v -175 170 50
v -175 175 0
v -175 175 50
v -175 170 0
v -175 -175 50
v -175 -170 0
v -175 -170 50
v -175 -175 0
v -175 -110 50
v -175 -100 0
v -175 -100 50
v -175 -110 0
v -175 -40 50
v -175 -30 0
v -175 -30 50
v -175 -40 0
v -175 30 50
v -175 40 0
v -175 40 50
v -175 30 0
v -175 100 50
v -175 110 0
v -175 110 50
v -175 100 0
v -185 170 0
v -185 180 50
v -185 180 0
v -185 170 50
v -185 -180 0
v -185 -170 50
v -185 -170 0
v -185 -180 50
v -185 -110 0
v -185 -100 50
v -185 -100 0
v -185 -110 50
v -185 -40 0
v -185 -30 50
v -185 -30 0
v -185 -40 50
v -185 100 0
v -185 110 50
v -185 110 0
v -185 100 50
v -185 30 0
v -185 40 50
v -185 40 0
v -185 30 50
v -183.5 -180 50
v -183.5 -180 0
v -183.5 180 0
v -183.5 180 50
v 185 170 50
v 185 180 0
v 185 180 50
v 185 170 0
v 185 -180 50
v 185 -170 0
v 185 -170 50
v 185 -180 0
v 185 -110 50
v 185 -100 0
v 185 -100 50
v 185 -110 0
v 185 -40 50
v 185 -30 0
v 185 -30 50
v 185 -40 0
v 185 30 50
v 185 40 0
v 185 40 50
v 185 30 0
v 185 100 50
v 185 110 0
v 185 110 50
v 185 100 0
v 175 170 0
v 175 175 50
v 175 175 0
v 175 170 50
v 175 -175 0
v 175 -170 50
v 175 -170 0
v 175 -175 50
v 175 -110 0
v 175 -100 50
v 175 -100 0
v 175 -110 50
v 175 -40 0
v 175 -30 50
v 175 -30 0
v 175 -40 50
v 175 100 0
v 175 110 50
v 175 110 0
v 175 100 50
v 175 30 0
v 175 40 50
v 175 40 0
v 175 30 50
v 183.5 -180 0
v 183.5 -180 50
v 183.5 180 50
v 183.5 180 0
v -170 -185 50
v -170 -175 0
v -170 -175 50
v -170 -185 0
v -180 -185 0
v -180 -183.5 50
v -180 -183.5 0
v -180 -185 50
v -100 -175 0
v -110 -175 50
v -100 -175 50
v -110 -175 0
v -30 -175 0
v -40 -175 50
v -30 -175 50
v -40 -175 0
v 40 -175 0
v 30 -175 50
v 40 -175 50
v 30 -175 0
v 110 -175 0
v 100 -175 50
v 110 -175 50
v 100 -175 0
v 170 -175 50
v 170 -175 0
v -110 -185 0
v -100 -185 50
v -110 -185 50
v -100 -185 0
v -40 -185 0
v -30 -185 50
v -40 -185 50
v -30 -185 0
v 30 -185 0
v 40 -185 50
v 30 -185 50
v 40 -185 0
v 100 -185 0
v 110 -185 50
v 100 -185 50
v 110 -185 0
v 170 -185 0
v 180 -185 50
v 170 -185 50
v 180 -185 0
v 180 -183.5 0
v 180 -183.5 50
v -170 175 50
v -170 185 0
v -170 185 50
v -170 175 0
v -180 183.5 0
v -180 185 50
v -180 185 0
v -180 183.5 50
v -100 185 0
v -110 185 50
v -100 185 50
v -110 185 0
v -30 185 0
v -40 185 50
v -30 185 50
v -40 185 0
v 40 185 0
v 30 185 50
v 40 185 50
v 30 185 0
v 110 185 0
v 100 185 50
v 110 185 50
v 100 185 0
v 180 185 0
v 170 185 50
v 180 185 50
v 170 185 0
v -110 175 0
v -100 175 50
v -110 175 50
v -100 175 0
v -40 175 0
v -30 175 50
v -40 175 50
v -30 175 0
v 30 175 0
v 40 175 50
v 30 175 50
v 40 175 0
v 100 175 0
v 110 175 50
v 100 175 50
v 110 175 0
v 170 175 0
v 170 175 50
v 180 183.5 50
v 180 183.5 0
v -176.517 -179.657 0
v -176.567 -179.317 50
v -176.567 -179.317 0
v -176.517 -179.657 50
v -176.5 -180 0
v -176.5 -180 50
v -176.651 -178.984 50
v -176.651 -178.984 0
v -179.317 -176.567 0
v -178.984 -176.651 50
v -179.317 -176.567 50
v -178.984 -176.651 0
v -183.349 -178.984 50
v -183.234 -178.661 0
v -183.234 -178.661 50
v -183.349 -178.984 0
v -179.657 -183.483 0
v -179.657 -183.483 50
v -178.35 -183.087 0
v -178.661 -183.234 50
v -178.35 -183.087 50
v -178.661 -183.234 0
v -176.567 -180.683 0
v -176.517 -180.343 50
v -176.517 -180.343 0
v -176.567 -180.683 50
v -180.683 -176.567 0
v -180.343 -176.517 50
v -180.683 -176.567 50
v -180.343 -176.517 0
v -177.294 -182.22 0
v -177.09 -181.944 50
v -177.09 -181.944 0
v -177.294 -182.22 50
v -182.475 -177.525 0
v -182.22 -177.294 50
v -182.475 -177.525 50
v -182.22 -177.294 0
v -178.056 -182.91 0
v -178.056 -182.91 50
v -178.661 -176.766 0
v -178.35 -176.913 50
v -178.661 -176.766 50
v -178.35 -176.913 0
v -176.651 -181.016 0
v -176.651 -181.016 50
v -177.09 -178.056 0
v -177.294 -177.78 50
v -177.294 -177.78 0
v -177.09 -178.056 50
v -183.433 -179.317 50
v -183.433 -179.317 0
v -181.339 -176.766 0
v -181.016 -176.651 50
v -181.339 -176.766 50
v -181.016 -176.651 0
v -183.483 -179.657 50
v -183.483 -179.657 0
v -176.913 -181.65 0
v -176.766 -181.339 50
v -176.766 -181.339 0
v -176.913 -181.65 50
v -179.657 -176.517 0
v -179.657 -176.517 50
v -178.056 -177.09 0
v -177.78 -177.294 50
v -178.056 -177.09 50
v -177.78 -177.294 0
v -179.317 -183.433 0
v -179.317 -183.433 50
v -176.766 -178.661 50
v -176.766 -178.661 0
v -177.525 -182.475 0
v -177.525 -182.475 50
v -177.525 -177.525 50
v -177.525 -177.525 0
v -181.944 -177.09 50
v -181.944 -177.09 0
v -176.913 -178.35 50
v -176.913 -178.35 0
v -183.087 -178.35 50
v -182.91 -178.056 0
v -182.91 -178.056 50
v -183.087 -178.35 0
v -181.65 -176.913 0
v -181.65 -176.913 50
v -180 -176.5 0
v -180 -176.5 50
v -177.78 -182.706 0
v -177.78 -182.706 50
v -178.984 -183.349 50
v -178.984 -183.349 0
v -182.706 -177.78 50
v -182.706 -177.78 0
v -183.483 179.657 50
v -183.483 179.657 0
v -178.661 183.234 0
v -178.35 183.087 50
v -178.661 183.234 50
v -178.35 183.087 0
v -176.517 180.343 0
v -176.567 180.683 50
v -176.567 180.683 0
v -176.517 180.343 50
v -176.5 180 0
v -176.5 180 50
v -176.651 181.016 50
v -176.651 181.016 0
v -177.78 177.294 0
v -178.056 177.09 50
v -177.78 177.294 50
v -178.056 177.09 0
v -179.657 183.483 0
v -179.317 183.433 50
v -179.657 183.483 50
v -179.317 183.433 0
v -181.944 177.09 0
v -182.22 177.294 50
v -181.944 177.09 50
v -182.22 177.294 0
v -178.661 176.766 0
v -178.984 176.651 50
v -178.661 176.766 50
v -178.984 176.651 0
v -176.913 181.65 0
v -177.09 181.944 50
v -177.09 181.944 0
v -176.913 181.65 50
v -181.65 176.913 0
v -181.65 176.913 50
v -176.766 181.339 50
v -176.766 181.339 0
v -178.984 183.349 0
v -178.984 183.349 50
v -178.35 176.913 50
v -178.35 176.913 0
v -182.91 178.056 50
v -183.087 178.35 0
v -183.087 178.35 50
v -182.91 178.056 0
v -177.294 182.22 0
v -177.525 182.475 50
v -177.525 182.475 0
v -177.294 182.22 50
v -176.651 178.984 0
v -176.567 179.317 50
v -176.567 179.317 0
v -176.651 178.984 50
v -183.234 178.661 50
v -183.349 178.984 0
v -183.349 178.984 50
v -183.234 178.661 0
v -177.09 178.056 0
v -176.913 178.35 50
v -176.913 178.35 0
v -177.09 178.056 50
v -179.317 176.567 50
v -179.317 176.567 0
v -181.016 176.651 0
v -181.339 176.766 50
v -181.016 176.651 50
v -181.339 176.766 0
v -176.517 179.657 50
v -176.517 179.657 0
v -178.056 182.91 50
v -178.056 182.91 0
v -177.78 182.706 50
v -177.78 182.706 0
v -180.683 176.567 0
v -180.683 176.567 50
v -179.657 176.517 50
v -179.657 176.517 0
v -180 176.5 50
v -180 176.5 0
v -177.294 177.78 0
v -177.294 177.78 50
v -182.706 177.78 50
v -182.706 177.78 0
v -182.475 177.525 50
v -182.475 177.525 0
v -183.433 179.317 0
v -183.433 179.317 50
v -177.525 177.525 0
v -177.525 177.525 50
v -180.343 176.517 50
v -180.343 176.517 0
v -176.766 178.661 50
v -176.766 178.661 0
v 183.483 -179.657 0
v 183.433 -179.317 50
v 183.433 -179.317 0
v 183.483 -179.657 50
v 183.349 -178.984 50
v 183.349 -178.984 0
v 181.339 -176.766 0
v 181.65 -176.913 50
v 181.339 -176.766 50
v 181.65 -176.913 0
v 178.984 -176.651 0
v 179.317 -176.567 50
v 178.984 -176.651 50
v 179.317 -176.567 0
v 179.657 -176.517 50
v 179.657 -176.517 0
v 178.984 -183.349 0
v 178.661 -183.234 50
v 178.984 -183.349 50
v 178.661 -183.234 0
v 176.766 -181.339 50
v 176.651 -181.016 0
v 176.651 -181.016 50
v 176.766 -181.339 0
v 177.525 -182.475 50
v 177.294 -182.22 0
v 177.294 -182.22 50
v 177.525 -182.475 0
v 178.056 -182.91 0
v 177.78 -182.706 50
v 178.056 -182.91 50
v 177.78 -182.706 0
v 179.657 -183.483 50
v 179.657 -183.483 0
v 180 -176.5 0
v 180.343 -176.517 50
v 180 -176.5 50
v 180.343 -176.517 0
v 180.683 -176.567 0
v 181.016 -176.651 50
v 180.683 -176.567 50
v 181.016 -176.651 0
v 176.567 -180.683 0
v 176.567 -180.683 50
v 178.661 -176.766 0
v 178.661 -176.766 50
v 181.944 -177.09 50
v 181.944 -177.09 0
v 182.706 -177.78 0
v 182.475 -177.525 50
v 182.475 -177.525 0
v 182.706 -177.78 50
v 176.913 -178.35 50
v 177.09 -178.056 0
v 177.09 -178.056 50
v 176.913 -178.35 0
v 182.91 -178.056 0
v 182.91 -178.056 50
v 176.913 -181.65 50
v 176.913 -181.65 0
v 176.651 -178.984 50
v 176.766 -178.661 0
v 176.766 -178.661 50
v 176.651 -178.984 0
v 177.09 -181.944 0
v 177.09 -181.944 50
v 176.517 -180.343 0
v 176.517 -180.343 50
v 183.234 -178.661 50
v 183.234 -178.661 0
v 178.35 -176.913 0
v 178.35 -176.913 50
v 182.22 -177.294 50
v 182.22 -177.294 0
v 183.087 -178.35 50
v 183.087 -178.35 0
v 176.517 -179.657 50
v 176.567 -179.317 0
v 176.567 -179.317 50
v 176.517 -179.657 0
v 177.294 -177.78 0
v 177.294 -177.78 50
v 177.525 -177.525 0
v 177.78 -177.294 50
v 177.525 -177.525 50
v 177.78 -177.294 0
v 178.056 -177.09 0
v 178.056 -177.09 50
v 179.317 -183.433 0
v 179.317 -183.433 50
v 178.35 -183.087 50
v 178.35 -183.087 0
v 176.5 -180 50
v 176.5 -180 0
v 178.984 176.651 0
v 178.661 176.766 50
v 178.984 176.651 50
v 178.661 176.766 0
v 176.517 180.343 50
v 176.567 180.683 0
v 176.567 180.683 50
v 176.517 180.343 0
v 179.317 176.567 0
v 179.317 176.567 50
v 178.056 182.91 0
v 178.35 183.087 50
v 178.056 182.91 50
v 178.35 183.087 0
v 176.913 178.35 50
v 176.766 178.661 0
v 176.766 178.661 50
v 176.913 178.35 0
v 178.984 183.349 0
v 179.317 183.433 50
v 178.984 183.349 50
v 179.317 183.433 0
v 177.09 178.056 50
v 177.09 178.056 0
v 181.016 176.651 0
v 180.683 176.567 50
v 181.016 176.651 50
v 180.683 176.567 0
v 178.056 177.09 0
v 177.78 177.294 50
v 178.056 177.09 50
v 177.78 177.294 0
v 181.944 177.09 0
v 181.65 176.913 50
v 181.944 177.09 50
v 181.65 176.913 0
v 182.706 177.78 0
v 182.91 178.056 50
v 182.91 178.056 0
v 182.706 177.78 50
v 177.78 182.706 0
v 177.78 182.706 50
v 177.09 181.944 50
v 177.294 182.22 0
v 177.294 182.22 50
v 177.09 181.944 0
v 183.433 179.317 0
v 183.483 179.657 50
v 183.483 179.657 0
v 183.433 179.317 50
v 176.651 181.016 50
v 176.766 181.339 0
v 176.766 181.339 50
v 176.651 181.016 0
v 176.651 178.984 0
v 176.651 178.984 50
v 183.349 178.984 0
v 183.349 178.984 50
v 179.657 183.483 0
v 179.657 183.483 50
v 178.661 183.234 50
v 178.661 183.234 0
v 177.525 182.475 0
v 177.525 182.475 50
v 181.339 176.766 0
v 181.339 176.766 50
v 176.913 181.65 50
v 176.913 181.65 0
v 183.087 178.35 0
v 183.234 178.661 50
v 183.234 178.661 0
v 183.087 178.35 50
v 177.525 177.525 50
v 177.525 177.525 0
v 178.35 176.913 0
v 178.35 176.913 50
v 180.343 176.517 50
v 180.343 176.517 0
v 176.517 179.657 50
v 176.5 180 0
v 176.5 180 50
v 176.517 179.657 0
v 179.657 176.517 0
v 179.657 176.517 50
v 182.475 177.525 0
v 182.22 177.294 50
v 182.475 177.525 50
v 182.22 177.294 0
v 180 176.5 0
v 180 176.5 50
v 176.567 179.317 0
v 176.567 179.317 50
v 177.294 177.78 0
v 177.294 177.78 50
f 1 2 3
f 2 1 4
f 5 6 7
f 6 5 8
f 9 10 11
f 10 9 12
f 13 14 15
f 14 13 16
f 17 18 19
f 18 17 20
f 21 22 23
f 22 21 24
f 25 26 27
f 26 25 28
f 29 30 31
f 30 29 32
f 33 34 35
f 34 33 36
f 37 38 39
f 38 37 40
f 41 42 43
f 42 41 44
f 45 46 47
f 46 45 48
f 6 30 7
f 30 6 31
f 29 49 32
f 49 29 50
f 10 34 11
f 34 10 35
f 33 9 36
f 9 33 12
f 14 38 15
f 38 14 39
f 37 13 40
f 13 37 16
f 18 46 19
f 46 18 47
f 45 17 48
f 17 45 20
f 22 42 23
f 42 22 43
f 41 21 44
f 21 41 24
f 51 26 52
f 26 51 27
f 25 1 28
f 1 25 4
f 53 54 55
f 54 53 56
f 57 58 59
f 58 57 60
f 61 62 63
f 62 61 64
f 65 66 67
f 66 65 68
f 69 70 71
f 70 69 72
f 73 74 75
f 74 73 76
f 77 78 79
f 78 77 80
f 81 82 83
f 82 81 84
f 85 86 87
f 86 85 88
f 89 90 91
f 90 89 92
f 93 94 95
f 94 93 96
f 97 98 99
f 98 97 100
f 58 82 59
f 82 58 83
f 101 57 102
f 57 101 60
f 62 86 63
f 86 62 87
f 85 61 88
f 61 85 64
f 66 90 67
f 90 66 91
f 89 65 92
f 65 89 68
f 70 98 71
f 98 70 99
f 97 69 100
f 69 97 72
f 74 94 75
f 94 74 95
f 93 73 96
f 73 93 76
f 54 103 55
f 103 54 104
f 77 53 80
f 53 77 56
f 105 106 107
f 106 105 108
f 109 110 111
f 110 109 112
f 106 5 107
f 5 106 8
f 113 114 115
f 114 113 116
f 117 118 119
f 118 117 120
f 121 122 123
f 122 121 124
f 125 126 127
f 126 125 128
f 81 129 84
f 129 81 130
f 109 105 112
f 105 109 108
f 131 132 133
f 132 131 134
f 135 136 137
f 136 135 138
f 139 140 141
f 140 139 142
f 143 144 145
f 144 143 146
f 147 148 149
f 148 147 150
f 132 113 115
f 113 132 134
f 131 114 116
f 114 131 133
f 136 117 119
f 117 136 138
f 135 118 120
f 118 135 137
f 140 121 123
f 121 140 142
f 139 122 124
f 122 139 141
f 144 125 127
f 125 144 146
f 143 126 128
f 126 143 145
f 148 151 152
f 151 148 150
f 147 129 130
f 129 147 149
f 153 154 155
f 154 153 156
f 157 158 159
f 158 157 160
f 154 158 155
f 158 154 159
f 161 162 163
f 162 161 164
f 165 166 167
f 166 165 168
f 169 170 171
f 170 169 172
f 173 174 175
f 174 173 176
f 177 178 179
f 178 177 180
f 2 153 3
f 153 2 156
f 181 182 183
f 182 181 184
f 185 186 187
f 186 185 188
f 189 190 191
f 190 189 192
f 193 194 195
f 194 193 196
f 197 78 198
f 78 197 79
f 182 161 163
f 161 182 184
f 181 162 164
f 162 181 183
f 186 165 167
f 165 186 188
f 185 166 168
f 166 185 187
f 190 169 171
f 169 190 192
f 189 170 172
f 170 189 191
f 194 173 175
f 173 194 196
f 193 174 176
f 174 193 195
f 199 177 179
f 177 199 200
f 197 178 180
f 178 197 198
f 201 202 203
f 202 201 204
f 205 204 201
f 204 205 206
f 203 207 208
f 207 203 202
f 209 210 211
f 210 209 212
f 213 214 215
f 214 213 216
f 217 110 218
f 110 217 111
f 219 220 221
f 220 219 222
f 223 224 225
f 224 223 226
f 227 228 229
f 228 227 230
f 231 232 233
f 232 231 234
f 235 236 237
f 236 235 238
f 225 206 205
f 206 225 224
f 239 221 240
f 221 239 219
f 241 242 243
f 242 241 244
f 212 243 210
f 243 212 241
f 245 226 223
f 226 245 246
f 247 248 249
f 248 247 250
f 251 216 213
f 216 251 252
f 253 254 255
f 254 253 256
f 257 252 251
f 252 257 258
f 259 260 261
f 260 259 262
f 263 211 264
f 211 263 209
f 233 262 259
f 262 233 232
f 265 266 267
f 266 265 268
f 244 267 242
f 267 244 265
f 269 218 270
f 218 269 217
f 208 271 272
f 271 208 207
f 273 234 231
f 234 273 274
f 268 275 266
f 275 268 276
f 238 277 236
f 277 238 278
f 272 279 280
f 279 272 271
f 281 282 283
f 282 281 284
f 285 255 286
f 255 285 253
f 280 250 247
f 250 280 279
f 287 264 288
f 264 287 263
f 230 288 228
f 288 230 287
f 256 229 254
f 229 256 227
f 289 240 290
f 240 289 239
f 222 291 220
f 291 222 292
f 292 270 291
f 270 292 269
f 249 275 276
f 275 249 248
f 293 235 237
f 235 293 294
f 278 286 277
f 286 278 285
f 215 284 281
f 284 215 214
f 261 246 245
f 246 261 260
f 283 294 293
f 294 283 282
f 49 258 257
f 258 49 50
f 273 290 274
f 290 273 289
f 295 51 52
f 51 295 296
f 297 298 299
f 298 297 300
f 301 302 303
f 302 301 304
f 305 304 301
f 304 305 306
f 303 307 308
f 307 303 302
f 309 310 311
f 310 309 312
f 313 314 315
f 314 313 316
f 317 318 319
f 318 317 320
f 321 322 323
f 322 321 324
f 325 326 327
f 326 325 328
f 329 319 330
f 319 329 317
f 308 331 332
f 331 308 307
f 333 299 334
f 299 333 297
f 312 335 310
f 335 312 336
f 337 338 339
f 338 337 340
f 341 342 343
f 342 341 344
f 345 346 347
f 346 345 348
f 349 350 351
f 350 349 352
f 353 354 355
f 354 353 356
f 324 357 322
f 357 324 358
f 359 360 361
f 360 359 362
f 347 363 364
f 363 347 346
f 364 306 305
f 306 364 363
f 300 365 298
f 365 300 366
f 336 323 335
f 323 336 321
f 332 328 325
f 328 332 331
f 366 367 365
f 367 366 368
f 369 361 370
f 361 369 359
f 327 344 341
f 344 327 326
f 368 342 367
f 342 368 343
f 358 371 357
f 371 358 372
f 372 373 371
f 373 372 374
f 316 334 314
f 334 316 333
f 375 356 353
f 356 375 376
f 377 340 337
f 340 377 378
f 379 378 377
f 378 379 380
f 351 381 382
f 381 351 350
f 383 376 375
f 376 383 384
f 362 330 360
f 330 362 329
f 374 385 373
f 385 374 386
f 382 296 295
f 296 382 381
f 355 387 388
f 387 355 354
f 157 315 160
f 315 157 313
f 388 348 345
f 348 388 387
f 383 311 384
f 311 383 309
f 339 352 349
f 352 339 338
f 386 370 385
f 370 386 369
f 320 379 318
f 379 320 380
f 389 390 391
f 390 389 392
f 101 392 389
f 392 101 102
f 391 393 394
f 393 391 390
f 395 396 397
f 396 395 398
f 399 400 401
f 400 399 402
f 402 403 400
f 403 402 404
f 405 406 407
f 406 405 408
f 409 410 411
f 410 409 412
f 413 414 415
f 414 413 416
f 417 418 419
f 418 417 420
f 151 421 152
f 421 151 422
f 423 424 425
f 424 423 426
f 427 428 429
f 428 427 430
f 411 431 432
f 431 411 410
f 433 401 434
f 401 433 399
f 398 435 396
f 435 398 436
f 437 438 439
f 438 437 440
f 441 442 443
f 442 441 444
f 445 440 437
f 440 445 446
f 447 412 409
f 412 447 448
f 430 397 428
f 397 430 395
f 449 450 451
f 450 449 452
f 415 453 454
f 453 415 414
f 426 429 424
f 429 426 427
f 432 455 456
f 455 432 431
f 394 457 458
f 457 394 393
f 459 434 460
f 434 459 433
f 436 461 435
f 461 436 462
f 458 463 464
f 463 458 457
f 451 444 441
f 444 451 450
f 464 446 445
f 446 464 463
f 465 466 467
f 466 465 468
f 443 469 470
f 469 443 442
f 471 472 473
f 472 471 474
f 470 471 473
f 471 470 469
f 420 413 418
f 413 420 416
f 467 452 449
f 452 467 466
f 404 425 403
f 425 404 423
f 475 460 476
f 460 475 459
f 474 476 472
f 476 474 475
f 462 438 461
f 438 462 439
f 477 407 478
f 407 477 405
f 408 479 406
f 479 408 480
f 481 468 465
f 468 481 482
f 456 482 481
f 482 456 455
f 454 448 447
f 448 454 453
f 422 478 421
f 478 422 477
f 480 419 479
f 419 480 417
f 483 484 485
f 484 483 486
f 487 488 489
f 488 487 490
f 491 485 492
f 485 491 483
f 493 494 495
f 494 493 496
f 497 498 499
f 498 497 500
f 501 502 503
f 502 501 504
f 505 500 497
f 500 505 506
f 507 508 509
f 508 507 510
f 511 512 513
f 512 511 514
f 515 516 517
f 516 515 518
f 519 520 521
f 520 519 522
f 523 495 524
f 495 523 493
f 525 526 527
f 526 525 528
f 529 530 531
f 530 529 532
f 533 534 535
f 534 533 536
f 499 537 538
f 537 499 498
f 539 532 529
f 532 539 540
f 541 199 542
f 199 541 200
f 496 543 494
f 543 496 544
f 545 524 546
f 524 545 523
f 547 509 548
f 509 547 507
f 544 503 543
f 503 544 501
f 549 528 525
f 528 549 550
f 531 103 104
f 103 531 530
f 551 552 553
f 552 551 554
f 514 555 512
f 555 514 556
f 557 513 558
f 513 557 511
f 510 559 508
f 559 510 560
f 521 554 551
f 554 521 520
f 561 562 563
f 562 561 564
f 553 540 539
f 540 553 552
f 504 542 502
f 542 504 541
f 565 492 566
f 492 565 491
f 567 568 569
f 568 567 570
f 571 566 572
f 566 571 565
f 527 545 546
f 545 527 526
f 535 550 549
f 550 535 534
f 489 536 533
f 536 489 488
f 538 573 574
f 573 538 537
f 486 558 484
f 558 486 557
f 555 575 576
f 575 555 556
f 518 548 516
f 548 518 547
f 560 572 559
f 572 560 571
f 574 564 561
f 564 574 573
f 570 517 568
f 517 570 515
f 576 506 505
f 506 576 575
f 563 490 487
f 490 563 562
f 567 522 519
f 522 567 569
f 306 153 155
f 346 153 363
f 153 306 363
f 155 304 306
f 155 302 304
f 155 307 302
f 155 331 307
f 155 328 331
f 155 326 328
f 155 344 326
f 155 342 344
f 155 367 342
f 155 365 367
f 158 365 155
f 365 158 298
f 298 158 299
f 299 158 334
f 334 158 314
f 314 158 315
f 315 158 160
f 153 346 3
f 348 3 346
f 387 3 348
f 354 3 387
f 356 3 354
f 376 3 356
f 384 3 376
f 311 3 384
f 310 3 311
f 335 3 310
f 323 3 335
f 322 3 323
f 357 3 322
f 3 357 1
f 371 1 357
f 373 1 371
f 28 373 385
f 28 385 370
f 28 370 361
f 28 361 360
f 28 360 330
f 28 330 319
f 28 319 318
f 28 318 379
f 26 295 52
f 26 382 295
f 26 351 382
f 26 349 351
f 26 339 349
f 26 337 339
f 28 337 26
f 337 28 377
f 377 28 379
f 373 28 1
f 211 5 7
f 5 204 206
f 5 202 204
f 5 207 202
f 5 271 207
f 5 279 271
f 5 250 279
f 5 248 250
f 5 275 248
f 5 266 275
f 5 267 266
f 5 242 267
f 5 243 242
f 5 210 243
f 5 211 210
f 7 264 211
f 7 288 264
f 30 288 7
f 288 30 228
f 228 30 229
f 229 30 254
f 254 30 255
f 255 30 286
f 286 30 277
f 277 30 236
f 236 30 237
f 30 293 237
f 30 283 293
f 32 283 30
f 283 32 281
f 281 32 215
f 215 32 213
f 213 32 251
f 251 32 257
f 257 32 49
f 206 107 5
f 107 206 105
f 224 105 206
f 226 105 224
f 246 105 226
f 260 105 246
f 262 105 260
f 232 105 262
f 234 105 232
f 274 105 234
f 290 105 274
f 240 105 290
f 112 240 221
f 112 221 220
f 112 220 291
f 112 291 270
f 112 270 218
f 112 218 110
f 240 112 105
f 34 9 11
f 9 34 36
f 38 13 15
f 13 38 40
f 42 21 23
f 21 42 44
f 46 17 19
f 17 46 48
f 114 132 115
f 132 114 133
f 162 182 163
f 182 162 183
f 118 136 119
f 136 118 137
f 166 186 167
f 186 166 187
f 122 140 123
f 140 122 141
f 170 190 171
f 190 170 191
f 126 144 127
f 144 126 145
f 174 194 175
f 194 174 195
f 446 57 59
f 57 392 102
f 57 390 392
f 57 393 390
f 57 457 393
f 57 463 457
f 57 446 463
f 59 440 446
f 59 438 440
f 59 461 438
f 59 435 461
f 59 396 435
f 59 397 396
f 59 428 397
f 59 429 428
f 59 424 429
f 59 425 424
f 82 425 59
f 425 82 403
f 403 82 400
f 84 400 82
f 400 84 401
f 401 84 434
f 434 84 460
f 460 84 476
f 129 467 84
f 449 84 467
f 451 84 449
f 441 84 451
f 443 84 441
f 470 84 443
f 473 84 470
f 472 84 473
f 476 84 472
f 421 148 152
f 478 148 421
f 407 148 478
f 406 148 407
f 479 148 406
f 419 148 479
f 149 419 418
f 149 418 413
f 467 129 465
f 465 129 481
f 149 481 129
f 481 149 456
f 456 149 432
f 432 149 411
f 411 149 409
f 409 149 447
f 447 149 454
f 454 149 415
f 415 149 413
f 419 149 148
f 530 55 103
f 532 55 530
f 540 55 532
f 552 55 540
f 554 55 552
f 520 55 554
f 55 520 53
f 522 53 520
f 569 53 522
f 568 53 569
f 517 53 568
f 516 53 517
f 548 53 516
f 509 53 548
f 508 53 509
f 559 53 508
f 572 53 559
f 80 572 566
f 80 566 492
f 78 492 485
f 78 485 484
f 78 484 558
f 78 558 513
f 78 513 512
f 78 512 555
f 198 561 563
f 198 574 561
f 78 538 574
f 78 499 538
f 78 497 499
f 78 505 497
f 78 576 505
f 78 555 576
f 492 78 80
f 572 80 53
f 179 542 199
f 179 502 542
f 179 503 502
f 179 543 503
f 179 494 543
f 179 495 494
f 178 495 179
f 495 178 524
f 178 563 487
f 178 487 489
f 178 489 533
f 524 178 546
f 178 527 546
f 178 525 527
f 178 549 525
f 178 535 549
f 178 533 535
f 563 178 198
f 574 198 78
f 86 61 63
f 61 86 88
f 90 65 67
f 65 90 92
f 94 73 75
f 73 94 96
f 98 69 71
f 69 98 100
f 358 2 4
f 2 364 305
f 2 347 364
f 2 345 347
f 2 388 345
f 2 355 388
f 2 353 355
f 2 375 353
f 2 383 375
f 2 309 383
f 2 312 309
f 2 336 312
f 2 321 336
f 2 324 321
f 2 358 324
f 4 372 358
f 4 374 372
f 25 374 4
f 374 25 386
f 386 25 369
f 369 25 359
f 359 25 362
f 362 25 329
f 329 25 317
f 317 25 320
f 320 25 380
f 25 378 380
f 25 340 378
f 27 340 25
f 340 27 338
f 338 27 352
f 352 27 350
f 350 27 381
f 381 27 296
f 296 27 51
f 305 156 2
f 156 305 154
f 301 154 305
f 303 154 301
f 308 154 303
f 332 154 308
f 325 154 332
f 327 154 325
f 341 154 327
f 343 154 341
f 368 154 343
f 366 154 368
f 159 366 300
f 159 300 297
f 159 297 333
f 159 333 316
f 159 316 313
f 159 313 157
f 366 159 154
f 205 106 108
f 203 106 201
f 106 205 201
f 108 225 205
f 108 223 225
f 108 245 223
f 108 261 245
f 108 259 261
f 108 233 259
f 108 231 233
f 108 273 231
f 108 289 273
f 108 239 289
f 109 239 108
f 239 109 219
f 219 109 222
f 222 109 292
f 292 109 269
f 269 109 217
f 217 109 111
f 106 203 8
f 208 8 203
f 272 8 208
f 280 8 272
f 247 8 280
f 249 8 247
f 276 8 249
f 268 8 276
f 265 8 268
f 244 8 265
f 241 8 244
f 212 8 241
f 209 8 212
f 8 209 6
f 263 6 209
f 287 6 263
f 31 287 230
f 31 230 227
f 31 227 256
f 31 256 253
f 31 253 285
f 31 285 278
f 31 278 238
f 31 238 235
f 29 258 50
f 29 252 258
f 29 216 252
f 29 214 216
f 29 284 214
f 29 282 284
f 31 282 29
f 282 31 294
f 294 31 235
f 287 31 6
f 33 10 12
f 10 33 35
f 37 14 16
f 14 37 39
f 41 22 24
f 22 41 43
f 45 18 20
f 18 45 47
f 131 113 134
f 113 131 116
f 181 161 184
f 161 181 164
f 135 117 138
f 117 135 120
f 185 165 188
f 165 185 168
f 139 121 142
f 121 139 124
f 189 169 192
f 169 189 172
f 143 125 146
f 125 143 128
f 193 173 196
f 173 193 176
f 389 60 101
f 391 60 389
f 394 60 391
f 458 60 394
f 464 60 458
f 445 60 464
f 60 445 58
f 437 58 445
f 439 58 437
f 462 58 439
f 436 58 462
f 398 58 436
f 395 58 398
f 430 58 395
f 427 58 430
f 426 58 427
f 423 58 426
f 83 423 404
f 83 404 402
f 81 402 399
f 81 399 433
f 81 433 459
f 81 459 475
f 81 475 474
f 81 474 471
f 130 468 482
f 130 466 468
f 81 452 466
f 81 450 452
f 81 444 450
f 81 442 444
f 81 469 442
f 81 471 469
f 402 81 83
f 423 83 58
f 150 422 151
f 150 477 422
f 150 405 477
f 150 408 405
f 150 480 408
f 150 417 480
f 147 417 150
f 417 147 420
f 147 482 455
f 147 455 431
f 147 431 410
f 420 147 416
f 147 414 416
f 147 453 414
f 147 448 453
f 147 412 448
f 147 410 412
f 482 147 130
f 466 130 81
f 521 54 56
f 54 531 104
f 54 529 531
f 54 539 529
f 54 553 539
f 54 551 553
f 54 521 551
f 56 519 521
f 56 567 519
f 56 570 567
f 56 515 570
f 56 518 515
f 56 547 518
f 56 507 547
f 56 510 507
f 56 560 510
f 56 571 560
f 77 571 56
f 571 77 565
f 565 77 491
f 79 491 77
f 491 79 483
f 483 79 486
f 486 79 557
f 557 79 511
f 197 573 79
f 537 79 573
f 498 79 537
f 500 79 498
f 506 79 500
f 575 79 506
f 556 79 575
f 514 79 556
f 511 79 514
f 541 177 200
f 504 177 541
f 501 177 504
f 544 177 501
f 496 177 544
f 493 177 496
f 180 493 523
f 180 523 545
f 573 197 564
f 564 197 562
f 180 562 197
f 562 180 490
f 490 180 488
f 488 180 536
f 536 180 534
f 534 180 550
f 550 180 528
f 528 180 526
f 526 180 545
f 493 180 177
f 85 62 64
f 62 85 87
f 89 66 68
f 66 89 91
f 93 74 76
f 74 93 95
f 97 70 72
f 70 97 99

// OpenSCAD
/*
  Cage slice 14 of 15
*/

bar = 10;
half_inner = 175;
gap = 70;
rod_d = 7;
half_outer = half_inner + bar;

function grid_pos(n) = -half_inner + n * gap;

module cage_full() {
  difference() {
    union() {
      // Floor grid at z = -10 .. 0
      for (j = [0:5]) {
        y = grid_pos(j);
        translate([-half_inner, y - bar/2, -bar])
          cube([2*half_inner, bar, bar], center=false);
      }
      for (i = [0:5]) {
        x = grid_pos(i);
        translate([x - bar/2, -half_inner, -bar])
          cube([bar, 2*half_inner, bar], center=false);
      }

      // Roof grid at z = 700 .. 710
      for (j = [0:5]) {
        y = grid_pos(j);
        translate([-half_inner, y - bar/2, 700])
          cube([2*half_inner, bar, bar], center=false);
      }
      for (i = [0:5]) {
        x = grid_pos(i);
        translate([x - bar/2, -half_inner, 700])
          cube([bar, 2*half_inner, bar], center=false);
      }

      // Side walls at x = ±175
      for (side = [-1, 1]) {
        sx = side * half_inner;
        x0 = (side == 1) ? sx : sx - bar;
        for (j = [0:5]) {
          y = grid_pos(j);
          translate([x0, y - bar/2, 0])
            cube([bar, bar, 700], center=false);
        }
        for (k = [0:10]) {
          zc = 0 + k * gap;
          translate([x0, -half_inner, zc - bar/2])
            cube([bar, 2*half_inner, bar], center=false);
        }
      }

      // Front/back walls at y = ±175
      for (side = [-1, 1]) {
        sy = side * half_inner;
        y0 = (side == 1) ? sy : sy - bar;
        for (i = [0:5]) {
          x = grid_pos(i);
          translate([x - bar/2, y0, 0])
            cube([bar, bar, 700], center=false);
        }
        for (k = [0:10]) {
          zc = 0 + k * gap;
          translate([-half_inner, y0, zc - bar/2])
            cube([2*half_inner, bar, bar], center=false);
        }
      }
    }

    for (sx = [-1, 1], sy = [-1, 1]) {
      translate([sx * (half_inner + bar/2),
                 sy * (half_inner + bar/2),
                 -20])
        cylinder(d = rod_d, h = 740, $fn = 64);
    }
  }
}

z_min = 640;
z_max = 690;  // height 50 mm

module slice() {
  intersection() {
    cage_full();
    translate([-half_outer - 5, -half_outer - 5, z_min])
      cube([2*(half_outer + 5), 2*(half_outer + 5), z_max - z_min], center=false);
  }
}

translate([0, 0, -z_min])
  slice();
